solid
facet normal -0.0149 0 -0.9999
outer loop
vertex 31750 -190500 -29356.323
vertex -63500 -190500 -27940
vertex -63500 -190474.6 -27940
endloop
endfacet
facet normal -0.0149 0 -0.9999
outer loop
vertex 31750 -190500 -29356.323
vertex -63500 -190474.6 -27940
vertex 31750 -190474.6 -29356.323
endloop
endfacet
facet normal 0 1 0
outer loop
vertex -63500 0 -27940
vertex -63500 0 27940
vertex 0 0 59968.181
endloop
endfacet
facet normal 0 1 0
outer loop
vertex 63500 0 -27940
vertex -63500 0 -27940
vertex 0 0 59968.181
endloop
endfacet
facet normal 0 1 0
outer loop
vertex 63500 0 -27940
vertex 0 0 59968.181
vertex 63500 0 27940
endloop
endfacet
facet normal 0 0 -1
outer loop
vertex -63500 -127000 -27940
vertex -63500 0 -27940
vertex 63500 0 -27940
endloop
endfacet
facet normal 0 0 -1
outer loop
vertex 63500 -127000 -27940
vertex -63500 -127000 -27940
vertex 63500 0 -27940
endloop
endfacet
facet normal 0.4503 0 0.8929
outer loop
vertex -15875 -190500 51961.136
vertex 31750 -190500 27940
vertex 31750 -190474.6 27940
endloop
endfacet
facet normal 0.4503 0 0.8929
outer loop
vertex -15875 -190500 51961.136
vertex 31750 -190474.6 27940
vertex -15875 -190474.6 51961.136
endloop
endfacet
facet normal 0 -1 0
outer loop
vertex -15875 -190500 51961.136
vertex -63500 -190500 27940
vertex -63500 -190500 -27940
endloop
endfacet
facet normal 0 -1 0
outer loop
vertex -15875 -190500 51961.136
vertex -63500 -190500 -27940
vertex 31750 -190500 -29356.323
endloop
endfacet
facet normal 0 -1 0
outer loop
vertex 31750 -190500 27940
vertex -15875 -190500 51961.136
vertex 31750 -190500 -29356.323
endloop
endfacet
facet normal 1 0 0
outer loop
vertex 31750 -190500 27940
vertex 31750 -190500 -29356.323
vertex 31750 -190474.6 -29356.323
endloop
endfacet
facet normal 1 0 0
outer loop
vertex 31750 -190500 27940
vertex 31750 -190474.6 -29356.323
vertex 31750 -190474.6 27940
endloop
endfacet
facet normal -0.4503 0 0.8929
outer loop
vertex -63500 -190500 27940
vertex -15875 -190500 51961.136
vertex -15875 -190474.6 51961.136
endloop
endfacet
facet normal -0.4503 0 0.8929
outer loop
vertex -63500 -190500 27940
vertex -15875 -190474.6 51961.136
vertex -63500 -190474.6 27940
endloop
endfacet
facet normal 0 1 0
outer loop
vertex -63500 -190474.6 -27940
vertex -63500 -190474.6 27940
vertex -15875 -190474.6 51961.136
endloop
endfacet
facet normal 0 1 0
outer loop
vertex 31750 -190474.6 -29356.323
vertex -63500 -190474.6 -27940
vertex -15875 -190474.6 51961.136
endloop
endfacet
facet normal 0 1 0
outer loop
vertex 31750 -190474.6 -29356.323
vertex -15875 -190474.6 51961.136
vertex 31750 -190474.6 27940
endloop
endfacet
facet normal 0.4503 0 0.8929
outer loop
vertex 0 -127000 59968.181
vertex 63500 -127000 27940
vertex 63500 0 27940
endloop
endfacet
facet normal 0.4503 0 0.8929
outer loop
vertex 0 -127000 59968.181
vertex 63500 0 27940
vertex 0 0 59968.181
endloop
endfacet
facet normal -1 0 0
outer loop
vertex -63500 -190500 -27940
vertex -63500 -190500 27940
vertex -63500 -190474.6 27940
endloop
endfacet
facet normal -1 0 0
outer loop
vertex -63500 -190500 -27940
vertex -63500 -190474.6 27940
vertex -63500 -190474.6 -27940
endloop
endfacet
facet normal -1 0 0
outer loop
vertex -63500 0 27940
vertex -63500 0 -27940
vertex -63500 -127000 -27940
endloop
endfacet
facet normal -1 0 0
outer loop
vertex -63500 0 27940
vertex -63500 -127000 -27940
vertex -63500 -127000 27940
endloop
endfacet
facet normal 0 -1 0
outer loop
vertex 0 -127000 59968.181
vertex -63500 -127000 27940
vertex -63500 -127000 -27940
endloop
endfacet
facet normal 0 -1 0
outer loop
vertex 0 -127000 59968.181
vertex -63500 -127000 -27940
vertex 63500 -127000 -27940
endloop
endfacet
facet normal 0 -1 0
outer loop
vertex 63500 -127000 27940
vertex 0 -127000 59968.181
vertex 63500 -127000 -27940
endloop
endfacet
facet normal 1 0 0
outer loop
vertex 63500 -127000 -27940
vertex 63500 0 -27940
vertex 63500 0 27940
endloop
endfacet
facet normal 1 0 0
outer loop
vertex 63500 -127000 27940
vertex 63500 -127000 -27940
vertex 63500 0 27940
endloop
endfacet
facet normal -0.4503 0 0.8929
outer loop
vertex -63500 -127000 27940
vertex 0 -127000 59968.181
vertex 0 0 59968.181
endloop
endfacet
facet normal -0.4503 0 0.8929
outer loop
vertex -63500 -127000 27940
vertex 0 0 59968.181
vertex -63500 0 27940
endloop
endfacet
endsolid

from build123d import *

# Parameters (mm, degrees)
F0_W     = 127000
F0_H     = 55880
F1_DEPTH = 127000
F3_DEPTH = 127000
F8_DEPTH = 25.4


# Not quite as in the source:
# - the program builds the solid bodies; features that only make, move or delete a surface that nothing else refers to are left out


with BuildPart() as f1:
    # F0 (on Front) → F1 (new body)
    with BuildSketch(Plane.XZ):
        Rectangle(F0_W, F0_H)
    extrude(amount=F1_DEPTH)

    # F2 (on face) → F3 (join)
    with BuildSketch(Plane.XZ.offset(127000)):
        Polygon((0, 59968.181340813), (-63500, 27940), (63500, 27940), align=None)
    extrude(amount=-F3_DEPTH)


with BuildPart() as f8:
    # F7 (on offset) → F8 (new body)
    with BuildSketch(Plane.XZ.offset(190500)):
        Polygon((-15875, 51961.1360056098), (-63500, 27940), (-63500, -27940), (31750, -29356.3232421875), (31750, 27940), align=None)
    extrude(amount=-F8_DEPTH)


solid = Compound([f1.part, f8.part])
